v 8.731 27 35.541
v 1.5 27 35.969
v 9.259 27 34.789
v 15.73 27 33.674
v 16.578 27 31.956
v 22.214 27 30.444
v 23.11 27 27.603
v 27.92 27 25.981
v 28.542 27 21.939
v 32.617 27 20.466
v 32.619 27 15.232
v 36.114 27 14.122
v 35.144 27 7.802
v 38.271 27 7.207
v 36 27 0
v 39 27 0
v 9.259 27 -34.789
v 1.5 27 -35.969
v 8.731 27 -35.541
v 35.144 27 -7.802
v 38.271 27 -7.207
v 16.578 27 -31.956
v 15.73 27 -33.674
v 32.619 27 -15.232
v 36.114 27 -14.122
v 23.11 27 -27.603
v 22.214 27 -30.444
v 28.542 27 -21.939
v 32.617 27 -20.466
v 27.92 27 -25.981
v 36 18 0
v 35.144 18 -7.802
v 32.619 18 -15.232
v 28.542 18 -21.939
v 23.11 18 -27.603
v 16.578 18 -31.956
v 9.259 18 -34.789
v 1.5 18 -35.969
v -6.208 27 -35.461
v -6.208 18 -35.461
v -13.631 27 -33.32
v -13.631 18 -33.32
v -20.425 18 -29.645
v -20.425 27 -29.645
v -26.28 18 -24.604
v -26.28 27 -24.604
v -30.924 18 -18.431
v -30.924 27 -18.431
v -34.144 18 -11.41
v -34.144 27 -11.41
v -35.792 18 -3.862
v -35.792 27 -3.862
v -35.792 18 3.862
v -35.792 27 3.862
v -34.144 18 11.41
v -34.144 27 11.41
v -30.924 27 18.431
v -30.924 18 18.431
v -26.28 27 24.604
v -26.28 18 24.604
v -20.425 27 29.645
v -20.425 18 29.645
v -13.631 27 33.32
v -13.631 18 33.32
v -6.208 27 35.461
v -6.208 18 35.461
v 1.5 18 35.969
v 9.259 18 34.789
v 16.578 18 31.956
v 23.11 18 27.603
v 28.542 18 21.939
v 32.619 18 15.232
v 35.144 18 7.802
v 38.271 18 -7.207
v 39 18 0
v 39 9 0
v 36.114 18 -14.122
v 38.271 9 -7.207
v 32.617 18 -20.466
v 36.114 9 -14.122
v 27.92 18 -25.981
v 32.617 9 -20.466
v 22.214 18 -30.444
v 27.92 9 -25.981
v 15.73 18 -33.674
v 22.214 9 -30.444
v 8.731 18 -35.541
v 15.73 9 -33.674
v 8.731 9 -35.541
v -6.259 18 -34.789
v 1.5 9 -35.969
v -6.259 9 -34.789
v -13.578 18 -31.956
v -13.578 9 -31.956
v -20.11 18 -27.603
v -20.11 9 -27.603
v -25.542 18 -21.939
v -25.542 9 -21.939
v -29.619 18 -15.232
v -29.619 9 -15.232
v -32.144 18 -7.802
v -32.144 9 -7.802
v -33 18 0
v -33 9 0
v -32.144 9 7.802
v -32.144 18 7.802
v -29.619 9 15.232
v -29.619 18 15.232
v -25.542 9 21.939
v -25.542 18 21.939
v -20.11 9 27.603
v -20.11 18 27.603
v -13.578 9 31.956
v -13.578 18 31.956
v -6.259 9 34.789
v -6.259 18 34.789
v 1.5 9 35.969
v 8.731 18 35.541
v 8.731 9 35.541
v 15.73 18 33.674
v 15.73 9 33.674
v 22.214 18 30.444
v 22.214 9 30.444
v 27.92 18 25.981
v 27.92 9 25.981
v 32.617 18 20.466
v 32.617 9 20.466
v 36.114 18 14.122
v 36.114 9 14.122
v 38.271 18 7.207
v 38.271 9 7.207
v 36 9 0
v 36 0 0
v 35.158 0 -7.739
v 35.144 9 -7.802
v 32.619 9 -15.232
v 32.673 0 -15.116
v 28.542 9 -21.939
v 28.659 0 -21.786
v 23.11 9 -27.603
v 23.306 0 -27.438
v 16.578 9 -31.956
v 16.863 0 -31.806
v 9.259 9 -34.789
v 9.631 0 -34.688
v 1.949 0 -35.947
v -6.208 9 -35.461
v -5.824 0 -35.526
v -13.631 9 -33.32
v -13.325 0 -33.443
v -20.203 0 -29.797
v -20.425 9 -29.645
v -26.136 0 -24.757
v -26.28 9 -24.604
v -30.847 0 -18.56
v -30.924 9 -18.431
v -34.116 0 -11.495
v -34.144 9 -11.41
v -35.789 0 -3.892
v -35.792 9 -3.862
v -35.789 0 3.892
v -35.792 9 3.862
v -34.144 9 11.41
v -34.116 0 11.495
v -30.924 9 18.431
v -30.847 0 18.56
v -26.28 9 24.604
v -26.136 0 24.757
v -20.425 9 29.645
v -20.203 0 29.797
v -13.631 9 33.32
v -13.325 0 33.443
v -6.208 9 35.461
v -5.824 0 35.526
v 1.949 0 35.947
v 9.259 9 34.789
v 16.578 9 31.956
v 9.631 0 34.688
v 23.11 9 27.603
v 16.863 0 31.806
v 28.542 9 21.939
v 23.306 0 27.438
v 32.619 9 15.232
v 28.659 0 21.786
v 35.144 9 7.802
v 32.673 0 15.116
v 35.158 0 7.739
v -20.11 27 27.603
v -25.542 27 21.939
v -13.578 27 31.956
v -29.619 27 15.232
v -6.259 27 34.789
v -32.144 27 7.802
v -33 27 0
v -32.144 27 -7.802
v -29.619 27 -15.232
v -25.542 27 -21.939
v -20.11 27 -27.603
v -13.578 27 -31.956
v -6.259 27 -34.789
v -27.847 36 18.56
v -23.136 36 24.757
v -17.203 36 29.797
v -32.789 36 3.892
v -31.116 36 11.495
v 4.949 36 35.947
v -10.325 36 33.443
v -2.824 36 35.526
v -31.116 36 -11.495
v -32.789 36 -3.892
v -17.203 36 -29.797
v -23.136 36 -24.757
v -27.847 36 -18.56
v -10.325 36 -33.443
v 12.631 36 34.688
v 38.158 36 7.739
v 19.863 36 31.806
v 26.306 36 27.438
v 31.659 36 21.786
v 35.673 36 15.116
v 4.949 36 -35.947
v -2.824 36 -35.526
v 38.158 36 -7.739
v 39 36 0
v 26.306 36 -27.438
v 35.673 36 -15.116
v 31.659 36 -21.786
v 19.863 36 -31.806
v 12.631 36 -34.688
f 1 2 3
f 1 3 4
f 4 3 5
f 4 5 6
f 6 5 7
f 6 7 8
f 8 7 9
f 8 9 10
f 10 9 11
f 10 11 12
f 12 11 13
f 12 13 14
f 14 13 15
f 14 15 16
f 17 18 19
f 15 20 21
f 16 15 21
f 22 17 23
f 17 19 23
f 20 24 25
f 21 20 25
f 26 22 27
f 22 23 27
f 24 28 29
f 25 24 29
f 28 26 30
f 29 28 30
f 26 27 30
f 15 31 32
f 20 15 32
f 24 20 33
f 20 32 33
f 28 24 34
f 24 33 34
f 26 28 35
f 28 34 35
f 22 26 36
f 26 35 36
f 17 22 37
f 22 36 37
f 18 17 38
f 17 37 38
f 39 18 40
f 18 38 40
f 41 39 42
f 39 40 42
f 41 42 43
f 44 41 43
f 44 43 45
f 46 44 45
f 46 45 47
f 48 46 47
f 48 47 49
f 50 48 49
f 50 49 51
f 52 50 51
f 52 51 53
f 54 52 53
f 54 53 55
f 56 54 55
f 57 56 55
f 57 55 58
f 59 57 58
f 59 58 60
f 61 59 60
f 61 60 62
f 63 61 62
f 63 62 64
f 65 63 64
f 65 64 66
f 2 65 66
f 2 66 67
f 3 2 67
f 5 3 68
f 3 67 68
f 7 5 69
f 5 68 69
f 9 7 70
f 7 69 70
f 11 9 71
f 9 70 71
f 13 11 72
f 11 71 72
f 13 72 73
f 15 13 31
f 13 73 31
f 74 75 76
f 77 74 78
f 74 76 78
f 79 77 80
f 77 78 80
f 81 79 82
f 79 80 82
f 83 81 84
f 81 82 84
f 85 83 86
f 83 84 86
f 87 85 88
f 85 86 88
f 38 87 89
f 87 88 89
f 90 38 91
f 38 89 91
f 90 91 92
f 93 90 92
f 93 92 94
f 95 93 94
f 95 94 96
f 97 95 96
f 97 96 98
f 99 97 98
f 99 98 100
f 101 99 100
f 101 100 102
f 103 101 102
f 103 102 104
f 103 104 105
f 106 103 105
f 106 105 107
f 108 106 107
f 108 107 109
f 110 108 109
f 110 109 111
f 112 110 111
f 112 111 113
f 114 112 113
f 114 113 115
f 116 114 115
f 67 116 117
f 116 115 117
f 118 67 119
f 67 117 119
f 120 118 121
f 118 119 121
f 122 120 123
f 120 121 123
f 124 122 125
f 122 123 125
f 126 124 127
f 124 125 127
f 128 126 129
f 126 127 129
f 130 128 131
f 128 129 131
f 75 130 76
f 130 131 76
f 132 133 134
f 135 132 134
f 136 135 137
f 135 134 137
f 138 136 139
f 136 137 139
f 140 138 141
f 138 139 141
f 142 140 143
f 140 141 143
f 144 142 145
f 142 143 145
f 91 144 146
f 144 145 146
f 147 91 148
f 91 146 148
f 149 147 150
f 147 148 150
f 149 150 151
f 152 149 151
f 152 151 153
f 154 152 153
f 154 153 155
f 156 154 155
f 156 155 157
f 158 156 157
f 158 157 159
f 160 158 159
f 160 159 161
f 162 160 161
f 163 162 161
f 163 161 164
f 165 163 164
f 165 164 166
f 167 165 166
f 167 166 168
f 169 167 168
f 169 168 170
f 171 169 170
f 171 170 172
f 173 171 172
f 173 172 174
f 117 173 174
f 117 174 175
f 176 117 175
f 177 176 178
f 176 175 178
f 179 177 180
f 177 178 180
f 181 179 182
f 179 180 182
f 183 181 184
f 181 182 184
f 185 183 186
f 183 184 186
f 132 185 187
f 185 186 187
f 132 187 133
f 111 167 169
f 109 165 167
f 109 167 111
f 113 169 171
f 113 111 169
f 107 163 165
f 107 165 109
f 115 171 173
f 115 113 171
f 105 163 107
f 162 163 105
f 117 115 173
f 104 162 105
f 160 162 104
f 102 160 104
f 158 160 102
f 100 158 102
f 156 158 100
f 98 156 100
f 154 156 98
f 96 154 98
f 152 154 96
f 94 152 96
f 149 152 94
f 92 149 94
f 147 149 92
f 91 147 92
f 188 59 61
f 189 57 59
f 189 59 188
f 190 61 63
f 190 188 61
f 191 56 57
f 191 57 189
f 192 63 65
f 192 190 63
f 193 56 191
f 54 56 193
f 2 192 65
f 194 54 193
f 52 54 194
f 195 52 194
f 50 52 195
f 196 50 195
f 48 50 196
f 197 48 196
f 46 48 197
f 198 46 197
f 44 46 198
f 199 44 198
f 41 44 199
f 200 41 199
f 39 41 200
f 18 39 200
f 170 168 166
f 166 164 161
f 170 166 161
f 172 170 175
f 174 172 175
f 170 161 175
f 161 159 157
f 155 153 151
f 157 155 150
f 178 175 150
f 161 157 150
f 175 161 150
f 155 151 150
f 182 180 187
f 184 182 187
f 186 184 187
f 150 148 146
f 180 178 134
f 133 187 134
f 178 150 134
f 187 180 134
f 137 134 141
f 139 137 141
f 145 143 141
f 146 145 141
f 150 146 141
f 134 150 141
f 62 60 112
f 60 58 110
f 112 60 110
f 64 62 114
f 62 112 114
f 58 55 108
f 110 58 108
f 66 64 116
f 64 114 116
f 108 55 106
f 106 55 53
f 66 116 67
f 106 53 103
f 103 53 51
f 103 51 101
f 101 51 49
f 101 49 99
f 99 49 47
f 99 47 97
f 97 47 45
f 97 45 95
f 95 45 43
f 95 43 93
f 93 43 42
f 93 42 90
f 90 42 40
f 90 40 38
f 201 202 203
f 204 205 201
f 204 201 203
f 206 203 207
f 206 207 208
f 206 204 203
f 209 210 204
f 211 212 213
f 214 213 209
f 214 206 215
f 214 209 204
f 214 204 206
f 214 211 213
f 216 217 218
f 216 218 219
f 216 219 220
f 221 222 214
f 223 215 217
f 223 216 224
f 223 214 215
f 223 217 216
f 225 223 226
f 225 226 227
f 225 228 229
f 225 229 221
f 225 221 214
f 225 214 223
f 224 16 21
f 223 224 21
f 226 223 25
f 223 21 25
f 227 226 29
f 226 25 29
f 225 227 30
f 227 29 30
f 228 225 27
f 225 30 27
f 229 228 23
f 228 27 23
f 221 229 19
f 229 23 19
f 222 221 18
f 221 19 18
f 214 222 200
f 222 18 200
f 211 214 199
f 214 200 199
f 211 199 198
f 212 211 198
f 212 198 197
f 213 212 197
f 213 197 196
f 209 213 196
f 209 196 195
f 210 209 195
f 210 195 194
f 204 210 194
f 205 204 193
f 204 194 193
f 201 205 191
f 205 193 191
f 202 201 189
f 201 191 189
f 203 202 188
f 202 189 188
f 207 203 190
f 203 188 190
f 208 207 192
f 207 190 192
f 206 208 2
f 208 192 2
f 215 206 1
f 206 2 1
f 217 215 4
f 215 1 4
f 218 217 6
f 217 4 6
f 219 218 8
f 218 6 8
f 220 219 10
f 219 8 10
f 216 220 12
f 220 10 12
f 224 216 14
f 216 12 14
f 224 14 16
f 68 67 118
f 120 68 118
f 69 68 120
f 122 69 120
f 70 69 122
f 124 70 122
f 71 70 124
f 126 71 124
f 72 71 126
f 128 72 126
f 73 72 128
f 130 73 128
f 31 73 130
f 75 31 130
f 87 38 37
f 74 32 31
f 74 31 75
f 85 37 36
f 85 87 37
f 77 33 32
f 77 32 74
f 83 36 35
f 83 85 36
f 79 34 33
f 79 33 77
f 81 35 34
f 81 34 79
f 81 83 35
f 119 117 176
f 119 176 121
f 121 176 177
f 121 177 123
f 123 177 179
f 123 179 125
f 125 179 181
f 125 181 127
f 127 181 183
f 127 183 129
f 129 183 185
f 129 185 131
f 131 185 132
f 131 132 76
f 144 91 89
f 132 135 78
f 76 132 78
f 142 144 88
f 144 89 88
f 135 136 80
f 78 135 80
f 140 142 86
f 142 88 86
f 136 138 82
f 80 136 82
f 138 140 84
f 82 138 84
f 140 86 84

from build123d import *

# Parameters (mm, degrees)
SKETCH1_R           = 36
BOSS_EXTRUDE1_DEPTH = 9
SKETCH2_R           = 36
BOSS_EXTRUDE2_DEPTH = 9
SKETCH3_R           = 36
BOSS_EXTRUDE3_DEPTH = 9
SKETCH4_R           = 36
BOSS_EXTRUDE4_DEPTH = 9


with BuildPart() as part:
    # Sketch1 → Boss-Extrude1 (new body)
    with BuildSketch(Plane(origin=(0, 0, 0), x_dir=(1, 0, 0), z_dir=(0, 1, 0))):
        Circle(SKETCH1_R)
    extrude(amount=BOSS_EXTRUDE1_DEPTH)

    # Sketch2 → Boss-Extrude2 (add)
    with BuildSketch(Plane(origin=(0, 9, 0), x_dir=(1, 0, 0), z_dir=(0, 1, 0))):
        with Locations((3, 0)):
            Circle(SKETCH2_R)
    extrude(amount=BOSS_EXTRUDE2_DEPTH)

    # Sketch3 → Boss-Extrude3 (add)
    with BuildSketch(Plane(origin=(0, 18, 0), x_dir=(1, 0, 0), z_dir=(0, 1, 0))):
        Circle(SKETCH3_R)
    extrude(amount=BOSS_EXTRUDE3_DEPTH)

    # Sketch4 → Boss-Extrude4 (add)
    with BuildSketch(Plane(origin=(0, 27, 0), x_dir=(1, 0, 0), z_dir=(0, 1, 0))):
        with Locations((3, 0)):
            Circle(SKETCH4_R)
    extrude(amount=BOSS_EXTRUDE4_DEPTH)


solid = part.part
